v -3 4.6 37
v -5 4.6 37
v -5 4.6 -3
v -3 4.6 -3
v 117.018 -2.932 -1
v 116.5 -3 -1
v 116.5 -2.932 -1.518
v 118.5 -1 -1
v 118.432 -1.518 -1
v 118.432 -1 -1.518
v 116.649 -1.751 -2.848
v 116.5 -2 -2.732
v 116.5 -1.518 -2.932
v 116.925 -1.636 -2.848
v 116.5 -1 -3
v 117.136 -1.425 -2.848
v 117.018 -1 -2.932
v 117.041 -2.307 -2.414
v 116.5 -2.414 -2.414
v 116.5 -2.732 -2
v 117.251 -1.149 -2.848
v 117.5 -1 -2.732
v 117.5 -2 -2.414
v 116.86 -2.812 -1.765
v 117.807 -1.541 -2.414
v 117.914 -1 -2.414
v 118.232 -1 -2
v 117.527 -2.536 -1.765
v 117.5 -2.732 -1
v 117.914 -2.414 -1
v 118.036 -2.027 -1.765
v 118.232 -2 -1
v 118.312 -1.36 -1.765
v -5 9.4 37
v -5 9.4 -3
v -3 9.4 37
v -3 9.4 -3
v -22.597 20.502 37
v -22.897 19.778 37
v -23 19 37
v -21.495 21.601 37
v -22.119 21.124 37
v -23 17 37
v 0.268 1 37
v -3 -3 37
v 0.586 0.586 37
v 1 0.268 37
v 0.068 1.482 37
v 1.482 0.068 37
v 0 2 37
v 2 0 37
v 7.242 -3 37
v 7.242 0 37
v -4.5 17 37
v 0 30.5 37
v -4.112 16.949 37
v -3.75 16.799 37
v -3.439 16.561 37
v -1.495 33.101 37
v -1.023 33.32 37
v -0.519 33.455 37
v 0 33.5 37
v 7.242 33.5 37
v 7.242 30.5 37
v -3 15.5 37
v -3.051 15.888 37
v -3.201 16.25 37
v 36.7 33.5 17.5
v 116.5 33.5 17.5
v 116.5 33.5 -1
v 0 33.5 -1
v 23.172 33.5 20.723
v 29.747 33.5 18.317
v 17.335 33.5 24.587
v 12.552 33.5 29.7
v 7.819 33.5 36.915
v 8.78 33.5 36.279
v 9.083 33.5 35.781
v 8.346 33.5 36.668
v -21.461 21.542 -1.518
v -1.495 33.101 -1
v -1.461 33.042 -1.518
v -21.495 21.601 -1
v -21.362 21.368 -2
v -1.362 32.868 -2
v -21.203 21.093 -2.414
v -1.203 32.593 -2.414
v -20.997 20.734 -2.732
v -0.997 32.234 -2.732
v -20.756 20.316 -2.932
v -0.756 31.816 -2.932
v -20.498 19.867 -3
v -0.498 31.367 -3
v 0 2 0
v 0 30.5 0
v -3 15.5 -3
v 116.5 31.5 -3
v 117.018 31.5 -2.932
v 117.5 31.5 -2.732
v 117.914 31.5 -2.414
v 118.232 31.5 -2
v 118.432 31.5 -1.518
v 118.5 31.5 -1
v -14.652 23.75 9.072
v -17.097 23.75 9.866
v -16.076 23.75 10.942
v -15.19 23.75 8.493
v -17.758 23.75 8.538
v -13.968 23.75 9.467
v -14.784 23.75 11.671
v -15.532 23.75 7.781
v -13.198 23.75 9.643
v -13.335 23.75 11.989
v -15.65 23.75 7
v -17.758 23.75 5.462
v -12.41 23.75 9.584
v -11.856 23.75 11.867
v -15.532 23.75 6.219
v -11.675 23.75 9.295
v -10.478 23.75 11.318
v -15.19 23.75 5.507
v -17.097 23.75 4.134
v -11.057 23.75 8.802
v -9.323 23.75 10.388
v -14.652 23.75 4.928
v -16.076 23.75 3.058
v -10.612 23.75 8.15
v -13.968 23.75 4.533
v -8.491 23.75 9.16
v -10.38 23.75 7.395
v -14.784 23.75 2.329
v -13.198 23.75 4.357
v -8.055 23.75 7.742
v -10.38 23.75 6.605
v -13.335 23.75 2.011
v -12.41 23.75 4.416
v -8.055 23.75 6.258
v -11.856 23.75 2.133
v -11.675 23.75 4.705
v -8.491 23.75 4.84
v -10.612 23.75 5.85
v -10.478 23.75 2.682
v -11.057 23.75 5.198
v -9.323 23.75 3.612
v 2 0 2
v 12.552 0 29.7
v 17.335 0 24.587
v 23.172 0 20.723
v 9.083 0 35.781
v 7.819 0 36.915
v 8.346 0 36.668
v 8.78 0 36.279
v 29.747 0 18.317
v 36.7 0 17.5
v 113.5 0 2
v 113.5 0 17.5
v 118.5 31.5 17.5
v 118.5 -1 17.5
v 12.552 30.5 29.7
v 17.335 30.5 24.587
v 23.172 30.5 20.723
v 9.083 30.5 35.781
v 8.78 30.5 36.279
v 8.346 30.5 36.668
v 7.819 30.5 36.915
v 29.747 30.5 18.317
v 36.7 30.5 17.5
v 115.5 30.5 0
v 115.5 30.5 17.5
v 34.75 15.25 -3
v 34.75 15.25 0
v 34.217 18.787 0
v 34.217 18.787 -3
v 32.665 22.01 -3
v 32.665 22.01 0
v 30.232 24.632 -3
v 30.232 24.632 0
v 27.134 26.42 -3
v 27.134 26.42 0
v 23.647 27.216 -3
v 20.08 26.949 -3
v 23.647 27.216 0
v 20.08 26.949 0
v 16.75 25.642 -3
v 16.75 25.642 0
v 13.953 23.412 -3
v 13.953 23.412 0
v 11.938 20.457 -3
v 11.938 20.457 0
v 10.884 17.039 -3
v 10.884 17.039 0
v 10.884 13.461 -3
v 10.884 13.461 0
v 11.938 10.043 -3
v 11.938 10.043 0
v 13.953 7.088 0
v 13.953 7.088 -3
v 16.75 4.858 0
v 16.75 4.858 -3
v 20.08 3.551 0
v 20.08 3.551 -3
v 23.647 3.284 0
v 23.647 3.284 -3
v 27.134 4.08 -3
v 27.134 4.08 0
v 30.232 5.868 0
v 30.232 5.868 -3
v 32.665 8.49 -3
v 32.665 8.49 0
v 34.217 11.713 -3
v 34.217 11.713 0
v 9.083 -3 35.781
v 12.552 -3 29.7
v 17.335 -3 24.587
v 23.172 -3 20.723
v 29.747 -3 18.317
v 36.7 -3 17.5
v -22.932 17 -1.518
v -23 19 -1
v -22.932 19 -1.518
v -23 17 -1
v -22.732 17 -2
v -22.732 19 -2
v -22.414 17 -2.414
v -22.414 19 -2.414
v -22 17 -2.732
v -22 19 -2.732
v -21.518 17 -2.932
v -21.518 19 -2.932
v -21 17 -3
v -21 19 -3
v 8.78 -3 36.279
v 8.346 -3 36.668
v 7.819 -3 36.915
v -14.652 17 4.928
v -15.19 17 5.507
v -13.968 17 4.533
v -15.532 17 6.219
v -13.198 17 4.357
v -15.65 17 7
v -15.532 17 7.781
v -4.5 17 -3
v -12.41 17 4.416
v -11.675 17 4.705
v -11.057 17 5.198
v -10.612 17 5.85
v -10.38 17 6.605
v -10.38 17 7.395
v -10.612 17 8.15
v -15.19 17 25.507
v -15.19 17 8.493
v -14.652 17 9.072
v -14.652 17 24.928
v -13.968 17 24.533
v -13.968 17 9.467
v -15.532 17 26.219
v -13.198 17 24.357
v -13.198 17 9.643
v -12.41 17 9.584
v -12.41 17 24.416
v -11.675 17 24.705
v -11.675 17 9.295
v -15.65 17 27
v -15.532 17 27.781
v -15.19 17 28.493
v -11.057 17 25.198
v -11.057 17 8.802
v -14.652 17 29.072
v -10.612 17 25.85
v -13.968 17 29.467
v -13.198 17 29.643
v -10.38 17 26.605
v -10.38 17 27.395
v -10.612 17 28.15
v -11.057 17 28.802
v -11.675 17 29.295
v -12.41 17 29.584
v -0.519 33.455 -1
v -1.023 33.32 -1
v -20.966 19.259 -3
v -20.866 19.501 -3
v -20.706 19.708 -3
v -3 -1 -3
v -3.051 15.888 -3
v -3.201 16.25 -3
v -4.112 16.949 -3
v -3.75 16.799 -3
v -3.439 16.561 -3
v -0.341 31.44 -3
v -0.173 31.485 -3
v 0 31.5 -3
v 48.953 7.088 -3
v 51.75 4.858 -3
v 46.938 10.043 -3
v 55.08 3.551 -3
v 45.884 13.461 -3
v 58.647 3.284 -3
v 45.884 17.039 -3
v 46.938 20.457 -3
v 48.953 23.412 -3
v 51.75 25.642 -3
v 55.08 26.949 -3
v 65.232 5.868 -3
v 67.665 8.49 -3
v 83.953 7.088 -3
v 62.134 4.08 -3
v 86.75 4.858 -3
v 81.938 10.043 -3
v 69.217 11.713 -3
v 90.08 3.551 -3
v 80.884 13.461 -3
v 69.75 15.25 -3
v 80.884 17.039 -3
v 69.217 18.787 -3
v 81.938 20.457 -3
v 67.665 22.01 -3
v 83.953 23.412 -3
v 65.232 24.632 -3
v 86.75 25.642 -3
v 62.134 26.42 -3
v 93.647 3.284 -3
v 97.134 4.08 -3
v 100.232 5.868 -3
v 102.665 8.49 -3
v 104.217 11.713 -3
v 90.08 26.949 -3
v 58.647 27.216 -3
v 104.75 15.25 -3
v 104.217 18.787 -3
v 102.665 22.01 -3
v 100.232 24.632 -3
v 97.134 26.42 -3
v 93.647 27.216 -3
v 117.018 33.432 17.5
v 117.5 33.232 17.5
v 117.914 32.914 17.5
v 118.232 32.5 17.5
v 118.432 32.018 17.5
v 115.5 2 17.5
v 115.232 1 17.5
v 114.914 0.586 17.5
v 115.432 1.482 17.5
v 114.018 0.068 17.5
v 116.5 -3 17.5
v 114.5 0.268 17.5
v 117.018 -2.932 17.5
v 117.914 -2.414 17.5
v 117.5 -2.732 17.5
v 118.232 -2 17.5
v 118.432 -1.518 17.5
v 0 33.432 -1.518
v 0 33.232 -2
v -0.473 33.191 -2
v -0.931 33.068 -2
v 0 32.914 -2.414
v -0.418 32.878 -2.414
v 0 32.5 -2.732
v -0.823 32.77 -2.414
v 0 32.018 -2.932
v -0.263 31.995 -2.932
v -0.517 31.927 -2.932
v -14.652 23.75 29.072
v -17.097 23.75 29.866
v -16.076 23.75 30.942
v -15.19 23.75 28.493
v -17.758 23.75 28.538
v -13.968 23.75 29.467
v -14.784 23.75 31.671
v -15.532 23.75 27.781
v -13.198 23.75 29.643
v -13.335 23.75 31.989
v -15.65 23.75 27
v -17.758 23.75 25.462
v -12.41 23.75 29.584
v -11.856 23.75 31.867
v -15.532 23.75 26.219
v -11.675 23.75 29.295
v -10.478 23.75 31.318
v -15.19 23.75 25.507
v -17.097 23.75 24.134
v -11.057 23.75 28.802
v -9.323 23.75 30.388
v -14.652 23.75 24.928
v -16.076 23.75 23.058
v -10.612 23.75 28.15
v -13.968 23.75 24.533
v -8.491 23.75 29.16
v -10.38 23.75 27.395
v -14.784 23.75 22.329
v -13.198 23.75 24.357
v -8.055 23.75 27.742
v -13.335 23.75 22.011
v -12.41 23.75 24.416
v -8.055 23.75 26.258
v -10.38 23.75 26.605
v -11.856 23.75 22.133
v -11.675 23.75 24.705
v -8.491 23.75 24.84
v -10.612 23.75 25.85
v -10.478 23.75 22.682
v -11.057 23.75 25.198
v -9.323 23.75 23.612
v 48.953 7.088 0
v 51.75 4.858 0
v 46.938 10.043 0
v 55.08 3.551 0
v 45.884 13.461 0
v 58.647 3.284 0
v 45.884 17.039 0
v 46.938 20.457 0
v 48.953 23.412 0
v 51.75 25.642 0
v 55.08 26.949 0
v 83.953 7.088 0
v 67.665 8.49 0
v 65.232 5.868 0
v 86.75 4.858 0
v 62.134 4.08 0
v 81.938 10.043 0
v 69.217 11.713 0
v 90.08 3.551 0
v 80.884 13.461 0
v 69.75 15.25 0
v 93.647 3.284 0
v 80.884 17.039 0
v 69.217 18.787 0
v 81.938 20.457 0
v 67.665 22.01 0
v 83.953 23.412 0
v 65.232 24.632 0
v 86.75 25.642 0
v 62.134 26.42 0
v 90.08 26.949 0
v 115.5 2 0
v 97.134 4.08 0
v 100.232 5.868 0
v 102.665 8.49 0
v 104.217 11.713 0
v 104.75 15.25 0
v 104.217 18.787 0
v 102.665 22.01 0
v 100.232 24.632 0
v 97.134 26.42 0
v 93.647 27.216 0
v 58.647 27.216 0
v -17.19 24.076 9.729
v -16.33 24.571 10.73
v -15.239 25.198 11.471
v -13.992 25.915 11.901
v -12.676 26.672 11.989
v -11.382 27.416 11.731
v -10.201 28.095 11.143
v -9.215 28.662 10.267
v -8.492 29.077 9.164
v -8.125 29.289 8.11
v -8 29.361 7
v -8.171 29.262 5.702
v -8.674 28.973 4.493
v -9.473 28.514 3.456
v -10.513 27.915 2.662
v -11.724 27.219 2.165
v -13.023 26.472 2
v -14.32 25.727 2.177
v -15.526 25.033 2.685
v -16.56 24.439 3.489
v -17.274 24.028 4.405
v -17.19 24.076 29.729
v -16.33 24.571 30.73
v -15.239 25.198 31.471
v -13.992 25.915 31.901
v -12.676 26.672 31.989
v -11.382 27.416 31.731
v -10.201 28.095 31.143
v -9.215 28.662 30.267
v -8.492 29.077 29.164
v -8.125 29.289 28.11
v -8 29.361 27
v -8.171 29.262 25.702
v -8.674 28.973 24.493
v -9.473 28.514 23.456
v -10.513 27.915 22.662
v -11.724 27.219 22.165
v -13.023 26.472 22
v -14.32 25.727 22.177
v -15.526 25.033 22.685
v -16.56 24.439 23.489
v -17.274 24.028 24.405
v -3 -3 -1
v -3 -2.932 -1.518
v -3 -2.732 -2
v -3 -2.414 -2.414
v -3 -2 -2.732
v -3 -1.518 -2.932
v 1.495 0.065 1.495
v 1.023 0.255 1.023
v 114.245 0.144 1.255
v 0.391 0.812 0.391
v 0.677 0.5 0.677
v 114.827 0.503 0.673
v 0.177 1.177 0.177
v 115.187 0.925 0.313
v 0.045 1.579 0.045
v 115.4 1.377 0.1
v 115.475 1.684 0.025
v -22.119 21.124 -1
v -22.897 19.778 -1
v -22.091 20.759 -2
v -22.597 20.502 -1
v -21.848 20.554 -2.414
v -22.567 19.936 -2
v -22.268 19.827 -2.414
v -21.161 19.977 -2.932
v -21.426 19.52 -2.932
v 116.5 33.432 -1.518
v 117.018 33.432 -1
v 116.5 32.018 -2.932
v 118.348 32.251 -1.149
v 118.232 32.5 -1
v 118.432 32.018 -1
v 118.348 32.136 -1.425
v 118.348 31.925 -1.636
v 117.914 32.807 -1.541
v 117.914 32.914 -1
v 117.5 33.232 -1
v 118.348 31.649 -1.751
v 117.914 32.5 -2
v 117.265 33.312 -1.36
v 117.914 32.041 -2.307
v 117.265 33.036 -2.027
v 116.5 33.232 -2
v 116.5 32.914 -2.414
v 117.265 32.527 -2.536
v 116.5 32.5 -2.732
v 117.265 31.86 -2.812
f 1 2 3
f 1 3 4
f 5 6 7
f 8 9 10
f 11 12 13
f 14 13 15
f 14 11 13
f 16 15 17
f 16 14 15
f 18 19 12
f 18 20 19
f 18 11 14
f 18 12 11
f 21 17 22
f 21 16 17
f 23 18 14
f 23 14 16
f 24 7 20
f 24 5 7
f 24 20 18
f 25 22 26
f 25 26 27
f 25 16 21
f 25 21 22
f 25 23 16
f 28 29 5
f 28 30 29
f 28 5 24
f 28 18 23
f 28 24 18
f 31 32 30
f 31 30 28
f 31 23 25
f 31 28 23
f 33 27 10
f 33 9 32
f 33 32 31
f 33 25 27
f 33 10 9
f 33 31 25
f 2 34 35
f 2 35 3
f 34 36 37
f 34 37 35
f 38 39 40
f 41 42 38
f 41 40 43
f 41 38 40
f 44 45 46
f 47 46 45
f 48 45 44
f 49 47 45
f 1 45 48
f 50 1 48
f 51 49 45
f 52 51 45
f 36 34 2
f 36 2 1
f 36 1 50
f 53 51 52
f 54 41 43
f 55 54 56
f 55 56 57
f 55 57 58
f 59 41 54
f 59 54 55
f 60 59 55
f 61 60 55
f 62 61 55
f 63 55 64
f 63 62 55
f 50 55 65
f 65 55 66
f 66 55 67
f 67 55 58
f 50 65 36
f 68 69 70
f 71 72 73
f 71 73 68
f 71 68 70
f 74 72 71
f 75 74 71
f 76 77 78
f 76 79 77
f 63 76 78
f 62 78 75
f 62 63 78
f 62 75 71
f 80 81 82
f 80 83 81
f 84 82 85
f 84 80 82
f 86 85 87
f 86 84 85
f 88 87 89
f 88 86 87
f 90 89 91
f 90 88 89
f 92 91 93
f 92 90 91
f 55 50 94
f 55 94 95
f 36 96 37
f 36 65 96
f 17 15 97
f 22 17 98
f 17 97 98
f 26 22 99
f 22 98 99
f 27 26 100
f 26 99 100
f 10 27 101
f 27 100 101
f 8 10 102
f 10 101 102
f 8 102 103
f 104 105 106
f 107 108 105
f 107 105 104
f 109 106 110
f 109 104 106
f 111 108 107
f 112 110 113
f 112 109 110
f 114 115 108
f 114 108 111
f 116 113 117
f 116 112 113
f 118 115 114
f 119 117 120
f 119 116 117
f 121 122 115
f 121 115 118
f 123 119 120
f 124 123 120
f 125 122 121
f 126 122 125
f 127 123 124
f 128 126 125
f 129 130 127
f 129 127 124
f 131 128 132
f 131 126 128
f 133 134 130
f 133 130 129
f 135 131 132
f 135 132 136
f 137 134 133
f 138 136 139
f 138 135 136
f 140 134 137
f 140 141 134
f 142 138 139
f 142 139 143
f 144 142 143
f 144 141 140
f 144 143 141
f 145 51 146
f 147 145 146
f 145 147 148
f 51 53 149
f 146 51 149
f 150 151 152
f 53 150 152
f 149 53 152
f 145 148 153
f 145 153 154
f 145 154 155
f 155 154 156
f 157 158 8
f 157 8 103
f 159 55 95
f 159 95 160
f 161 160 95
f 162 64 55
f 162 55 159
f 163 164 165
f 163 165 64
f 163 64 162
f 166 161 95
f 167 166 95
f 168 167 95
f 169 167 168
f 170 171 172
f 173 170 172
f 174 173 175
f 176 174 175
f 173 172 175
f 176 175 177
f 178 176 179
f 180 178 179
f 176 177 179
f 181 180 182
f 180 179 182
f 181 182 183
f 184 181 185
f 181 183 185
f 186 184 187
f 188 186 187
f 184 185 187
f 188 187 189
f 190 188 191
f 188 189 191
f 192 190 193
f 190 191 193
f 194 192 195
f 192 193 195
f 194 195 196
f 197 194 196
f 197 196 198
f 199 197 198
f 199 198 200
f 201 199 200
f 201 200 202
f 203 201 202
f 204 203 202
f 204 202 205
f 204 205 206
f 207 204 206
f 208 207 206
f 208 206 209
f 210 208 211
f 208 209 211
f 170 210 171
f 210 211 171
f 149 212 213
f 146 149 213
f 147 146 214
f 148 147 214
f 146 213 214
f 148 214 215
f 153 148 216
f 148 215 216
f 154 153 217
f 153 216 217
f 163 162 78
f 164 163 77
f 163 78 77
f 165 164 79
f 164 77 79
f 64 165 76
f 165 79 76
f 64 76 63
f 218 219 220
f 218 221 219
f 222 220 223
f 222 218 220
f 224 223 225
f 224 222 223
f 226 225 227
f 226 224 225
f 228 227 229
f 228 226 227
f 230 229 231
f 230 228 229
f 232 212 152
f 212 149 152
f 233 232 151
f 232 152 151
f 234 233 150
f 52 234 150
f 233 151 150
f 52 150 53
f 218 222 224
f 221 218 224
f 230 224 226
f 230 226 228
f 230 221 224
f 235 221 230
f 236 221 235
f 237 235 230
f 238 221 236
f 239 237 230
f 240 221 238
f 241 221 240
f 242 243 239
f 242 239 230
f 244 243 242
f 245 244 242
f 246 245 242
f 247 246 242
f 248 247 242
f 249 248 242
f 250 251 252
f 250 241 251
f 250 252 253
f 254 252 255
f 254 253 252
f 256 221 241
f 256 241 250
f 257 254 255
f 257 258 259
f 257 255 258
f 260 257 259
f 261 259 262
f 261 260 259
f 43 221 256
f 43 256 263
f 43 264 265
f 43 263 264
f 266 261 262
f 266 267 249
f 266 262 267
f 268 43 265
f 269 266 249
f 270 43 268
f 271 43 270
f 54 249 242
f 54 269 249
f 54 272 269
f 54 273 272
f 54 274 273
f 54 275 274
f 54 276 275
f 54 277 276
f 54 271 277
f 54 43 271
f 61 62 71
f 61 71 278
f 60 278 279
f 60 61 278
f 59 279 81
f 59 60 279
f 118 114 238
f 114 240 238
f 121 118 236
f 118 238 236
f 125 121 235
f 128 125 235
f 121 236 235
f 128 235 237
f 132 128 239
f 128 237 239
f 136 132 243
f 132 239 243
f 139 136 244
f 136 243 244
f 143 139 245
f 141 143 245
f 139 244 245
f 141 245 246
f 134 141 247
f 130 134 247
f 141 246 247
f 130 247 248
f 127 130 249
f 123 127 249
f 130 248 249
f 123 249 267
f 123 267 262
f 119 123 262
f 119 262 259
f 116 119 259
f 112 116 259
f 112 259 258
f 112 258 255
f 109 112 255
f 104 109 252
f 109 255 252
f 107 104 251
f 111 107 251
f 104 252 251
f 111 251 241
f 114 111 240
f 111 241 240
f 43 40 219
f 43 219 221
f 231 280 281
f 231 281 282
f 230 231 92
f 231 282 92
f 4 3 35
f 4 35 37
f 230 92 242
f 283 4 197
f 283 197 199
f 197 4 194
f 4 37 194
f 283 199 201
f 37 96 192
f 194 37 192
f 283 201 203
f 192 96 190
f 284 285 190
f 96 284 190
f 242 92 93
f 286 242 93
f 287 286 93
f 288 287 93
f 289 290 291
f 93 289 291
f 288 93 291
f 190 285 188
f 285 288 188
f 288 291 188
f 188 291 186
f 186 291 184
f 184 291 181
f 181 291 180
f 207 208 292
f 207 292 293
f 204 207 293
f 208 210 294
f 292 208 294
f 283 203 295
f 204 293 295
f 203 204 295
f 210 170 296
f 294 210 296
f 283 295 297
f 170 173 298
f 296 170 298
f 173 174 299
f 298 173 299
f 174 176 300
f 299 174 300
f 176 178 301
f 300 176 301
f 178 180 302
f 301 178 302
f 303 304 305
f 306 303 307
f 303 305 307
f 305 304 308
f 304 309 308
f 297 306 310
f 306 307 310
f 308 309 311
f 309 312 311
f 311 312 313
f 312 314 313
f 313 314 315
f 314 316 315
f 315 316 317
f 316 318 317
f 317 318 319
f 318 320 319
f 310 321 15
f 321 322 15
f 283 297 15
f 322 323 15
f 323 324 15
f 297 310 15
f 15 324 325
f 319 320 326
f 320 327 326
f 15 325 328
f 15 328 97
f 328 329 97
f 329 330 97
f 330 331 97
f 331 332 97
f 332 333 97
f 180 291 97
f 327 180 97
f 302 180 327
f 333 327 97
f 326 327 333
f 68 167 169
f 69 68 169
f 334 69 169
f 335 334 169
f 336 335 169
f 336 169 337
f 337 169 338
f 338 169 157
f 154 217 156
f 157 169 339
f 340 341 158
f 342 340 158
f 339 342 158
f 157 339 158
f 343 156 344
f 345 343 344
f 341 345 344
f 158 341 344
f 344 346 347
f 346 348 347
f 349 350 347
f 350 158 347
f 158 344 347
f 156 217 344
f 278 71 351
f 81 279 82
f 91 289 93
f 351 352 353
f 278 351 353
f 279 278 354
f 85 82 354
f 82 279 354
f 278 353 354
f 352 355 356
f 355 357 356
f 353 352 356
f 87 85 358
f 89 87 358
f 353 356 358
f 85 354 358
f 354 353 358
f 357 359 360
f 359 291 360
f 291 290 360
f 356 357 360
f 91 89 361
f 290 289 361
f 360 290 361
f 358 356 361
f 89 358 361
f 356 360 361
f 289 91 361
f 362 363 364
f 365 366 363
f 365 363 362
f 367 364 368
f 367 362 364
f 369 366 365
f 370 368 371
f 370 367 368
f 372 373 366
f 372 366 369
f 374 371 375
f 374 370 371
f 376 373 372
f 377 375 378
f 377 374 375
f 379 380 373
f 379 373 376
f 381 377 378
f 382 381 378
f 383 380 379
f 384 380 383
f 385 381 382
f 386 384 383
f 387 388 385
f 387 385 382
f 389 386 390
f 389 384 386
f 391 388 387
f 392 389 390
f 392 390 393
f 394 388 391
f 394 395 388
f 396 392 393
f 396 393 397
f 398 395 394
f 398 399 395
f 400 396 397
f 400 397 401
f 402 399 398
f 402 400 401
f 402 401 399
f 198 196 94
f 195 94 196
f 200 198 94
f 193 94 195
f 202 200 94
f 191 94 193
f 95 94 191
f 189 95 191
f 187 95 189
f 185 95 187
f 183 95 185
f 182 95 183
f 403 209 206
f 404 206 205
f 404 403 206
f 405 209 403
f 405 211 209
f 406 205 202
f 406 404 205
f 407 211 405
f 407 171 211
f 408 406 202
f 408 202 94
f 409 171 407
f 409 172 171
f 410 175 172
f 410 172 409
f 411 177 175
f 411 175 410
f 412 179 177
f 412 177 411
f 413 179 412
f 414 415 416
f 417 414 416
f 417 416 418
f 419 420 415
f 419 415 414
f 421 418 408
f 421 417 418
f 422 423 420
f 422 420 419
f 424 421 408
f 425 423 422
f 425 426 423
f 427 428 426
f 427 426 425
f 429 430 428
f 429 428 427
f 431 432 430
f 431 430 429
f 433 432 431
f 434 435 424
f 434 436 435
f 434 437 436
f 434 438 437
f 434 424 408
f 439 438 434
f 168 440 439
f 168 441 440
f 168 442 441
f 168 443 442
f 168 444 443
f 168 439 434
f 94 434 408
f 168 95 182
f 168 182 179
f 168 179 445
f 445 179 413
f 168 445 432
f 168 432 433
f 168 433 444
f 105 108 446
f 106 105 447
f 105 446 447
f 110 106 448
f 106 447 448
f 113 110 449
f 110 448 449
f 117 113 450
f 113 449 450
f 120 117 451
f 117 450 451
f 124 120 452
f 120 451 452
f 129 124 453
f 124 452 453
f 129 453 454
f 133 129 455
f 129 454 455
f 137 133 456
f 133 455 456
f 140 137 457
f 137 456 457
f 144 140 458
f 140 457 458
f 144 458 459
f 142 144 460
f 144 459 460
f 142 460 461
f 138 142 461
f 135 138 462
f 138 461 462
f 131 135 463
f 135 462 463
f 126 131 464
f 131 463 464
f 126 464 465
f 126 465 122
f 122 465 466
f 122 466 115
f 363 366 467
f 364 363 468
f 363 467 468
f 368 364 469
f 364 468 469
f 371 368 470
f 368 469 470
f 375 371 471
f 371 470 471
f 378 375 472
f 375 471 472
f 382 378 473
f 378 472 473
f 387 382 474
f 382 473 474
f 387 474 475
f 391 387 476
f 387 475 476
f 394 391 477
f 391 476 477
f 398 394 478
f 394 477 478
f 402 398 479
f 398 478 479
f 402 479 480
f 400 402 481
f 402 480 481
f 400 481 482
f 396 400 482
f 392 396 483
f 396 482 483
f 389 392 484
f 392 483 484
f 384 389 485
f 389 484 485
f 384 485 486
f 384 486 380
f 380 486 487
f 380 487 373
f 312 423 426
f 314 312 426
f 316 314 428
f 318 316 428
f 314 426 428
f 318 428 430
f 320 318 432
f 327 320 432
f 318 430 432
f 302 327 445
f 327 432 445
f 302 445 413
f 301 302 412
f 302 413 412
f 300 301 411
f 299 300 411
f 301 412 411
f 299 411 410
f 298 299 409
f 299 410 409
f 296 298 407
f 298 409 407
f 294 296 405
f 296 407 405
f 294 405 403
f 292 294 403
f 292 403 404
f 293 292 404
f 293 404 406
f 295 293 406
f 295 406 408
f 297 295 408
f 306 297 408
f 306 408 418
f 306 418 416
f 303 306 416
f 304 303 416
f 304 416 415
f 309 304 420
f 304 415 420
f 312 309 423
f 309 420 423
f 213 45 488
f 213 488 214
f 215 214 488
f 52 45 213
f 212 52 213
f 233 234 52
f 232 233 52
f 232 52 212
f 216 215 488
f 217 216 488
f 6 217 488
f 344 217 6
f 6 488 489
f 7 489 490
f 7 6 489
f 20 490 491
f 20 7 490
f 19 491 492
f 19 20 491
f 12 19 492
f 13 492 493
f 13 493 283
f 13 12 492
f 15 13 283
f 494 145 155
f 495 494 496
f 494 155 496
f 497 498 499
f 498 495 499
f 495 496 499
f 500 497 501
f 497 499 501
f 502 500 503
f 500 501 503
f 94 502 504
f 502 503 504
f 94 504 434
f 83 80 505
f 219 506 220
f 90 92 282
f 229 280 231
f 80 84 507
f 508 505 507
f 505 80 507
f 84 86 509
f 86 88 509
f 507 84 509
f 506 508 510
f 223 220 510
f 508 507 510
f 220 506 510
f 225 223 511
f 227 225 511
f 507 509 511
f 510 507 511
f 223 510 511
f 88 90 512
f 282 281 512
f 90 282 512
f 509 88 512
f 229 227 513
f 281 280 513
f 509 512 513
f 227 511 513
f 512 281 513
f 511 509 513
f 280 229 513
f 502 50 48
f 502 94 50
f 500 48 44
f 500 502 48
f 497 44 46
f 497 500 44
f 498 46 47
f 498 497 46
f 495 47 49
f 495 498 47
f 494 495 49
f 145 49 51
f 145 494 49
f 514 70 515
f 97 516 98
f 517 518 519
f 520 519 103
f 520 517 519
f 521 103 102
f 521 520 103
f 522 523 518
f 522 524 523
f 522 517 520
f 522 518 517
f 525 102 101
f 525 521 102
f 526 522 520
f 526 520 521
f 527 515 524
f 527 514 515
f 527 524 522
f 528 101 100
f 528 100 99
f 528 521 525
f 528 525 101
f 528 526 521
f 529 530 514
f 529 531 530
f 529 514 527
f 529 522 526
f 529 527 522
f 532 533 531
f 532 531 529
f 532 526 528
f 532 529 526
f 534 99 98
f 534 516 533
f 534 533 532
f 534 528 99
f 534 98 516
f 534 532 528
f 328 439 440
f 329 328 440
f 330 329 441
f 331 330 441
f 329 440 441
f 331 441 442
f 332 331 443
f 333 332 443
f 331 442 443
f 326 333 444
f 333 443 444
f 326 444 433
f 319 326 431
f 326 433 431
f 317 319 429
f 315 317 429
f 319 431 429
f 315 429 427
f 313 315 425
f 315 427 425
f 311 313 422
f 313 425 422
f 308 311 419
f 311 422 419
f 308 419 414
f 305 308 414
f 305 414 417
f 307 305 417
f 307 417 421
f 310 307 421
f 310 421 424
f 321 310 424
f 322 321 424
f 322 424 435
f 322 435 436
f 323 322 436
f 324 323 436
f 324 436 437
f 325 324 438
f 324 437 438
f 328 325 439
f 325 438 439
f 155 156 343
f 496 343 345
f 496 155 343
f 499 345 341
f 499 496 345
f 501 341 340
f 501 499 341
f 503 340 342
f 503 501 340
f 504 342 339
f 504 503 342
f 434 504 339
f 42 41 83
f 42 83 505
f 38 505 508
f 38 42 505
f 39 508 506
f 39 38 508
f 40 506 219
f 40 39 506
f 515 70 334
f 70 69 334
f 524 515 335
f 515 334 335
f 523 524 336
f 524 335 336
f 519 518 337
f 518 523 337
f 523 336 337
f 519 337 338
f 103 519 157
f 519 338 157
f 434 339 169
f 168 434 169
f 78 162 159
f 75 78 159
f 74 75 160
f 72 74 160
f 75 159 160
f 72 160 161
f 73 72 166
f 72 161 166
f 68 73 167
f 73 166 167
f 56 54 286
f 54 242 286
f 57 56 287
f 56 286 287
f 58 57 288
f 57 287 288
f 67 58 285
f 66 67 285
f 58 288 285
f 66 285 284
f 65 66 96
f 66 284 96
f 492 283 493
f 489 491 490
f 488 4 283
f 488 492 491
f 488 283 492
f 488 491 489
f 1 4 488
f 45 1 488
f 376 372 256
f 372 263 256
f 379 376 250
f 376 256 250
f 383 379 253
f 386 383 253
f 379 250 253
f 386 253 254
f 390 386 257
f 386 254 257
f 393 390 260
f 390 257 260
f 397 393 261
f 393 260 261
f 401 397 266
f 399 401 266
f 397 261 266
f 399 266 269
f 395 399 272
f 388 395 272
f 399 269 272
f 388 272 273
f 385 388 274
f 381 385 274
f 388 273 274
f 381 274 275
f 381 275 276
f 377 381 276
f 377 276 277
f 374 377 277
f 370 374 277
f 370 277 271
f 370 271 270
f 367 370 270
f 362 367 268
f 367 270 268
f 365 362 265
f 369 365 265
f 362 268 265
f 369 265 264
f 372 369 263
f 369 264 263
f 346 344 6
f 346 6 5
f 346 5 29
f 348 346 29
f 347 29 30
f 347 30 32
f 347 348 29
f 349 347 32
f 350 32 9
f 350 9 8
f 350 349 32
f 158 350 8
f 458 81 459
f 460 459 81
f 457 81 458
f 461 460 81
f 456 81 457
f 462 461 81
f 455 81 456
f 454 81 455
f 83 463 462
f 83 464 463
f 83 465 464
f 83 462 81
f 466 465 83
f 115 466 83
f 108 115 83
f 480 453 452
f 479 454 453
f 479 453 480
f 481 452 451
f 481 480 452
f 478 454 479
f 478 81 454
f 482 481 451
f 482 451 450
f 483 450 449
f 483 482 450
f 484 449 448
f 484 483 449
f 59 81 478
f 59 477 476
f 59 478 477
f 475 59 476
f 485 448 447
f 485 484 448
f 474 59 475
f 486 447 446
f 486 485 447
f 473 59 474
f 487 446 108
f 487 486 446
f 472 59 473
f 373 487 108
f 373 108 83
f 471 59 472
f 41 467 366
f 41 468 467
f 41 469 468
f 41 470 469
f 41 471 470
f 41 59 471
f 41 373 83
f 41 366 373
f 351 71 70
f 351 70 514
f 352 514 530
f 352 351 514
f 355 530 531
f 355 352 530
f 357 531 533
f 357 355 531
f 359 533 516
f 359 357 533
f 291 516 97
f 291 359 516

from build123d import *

# Parameters (mm, degrees)
SKETCH1_R                      = 12
BOSS_EXTRUDE1_DEPTH            = 3
BOSS_EXTRUDE2_START            = 37
SKETCH1_3_W                    = 115.5
SKETCH1_3_H                    = 30.5
BOSS_EXTRUDE2_DEPTH            = 37
BOSS_EXTRUDE3_DEPTH            = 33.5
BOSS_EXTRUDE3_DEPTH_BACK       = 3
CBORE_FOR_M5_SHCS1_D           = 5.3
CBORE_FOR_M5_SHCS1_CBORE_D     = 10
CBORE_FOR_M5_SHCS1_CBORE_DEPTH = 9.75
FILLET1_R                      = 2
FILLET2_R                      = 1.5


with BuildPart() as part:
    # Sketch1 → Boss-Extrude1 (new body)
    with BuildSketch(Plane.XY):
        with BuildLine():
            Line((-3, -3), (118.5, -3))
            Line((118.5, -3), (118.5, 33.5))
            Line((118.5, 33.5), (0, 33.5))
            ThreePointArc((0, 33.5), (-0.773900275, 33.398461379), (-1.495413373, 33.100718909))
            Line((-1.495413373, 33.100718909), (-21.495413373, 21.600718909))
            ThreePointArc((-21.495413373, 21.600718909), (-22.596751829, 20.502291563), (-23, 19))
            Line((-23, 19), (-23, 17))
            Line((-23, 17), (-3, 17))
            Line((-3, 17), (-3, 9.4))
            Line((-3, 9.4), (-5, 9.4))
            Line((-5, 9.4), (-5, 4.6))
            Line((-5, 4.6), (-3, 4.6))
            Line((-3, 4.6), (-3, -3))
        make_face()
        with Locations((57.75, 15.25)):
            Circle(SKETCH1_R, mode=Mode.SUBTRACT)
        with Locations((22.75, 15.25)):
            Circle(SKETCH1_R, mode=Mode.SUBTRACT)
        with Locations((92.75, 15.25)):
            Circle(SKETCH1_R, mode=Mode.SUBTRACT)
    extrude(amount=-BOSS_EXTRUDE1_DEPTH)

    # Sketch1<3> → Boss-Extrude2 (add)
    with BuildSketch(Plane.XY.offset(BOSS_EXTRUDE2_START)):
        with BuildLine():
            Line((-3, -3), (118.5, -3))
            Line((118.5, -3), (118.5, 33.5))
            Line((118.5, 33.5), (0, 33.5))
            ThreePointArc((0, 33.5), (-0.773900275, 33.398461379), (-1.495413373, 33.100718909))
            Line((-1.495413373, 33.100718909), (-21.495413373, 21.600718909))
            ThreePointArc((-21.495413373, 21.600718909), (-22.596751829, 20.502291563), (-23, 19))
            Line((-23, 19), (-23, 17))
            Line((-23, 17), (-3, 17))
            Line((-3, 17), (-3, 9.4))
            Line((-3, 9.4), (-5, 9.4))
            Line((-5, 9.4), (-5, 4.6))
            Line((-5, 4.6), (-3, 4.6))
            Line((-3, 4.6), (-3, -3))
        make_face()
        with Locations((57.75, 15.25)):
            Rectangle(SKETCH1_3_W, SKETCH1_3_H, mode=Mode.SUBTRACT)
    extrude(amount=-BOSS_EXTRUDE2_DEPTH)


with BuildPart() as body_2:
    # Sketch2 → Boss-Extrude3 (new, two sides: drawn at the far end of the back side and taken through both)
    with BuildSketch(Plane(origin=(0, 0, 0), x_dir=(1, 0, 0), z_dir=(0, 1, 0)).offset(-BOSS_EXTRUDE3_DEPTH_BACK)):
        with BuildLine():
            Line((-23, -37), (8.597499345, -37))
            ThreePointArc((8.597499345, -37), (19.597359516, -22.852490863), (36.699987142, -17.500008554))
            Line((36.699987142, -17.500008554), (118.5, -17.500008554))
            Line((118.5, -17.500008554), (118.5, 3))
            Line((118.5, 3), (-23, 3))
            Line((-23, 3), (-23, -37))
        make_face()
    extrude(amount=BOSS_EXTRUDE3_DEPTH + BOSS_EXTRUDE3_DEPTH_BACK)


with BuildPart() as part_1:
    add(part.part)

    # Combine1: intersect body 2
    add(body_2.part, mode=Mode.INTERSECT)

    # CBORE for M5 SHCS1 (through all)
    with Locations(Plane(origin=(0, 33.5, 0), x_dir=(1, 0, 0), z_dir=(0, 1, 0))):
        with Locations((-13, -7), (-13, -27)):
            CounterBoreHole(CBORE_FOR_M5_SHCS1_D / 2, CBORE_FOR_M5_SHCS1_CBORE_D / 2, CBORE_FOR_M5_SHCS1_CBORE_DEPTH)

    # Fillet1
    fillet1_edges = [part_1.edges().sort_by_distance(p)[0] for p in [
        (8.597499345, -1.5, 37),
        (115.5, 0, 8.750004277),
        (8.597499345, 32, 37),
        (-23, 18, -3),
        (118.5, 33.5, 7.250004277),
        (118.5, -3, 7.250004277),
        (57.75, -3, -3),
        (118.5, 15.25, -3),
        (0, 0, 18.5),
        (59.25, 33.5, -3),
        (57.75, 0, 0),
        (-0.773900275, 33.398461379, -3),
        (-11.495413373, 27.350718909, -3),
        (-22.596751829, 20.502291563, -3),
    ]]
    fillet(fillet1_edges, radius=FILLET1_R)

    # Fillet2
    fillet2_edges = [part_1.edges().sort_by_distance(p)[0] for p in [
        (-3, 17, 17),
    ]]
    fillet(fillet2_edges, radius=FILLET2_R)


solid = part_1.part
